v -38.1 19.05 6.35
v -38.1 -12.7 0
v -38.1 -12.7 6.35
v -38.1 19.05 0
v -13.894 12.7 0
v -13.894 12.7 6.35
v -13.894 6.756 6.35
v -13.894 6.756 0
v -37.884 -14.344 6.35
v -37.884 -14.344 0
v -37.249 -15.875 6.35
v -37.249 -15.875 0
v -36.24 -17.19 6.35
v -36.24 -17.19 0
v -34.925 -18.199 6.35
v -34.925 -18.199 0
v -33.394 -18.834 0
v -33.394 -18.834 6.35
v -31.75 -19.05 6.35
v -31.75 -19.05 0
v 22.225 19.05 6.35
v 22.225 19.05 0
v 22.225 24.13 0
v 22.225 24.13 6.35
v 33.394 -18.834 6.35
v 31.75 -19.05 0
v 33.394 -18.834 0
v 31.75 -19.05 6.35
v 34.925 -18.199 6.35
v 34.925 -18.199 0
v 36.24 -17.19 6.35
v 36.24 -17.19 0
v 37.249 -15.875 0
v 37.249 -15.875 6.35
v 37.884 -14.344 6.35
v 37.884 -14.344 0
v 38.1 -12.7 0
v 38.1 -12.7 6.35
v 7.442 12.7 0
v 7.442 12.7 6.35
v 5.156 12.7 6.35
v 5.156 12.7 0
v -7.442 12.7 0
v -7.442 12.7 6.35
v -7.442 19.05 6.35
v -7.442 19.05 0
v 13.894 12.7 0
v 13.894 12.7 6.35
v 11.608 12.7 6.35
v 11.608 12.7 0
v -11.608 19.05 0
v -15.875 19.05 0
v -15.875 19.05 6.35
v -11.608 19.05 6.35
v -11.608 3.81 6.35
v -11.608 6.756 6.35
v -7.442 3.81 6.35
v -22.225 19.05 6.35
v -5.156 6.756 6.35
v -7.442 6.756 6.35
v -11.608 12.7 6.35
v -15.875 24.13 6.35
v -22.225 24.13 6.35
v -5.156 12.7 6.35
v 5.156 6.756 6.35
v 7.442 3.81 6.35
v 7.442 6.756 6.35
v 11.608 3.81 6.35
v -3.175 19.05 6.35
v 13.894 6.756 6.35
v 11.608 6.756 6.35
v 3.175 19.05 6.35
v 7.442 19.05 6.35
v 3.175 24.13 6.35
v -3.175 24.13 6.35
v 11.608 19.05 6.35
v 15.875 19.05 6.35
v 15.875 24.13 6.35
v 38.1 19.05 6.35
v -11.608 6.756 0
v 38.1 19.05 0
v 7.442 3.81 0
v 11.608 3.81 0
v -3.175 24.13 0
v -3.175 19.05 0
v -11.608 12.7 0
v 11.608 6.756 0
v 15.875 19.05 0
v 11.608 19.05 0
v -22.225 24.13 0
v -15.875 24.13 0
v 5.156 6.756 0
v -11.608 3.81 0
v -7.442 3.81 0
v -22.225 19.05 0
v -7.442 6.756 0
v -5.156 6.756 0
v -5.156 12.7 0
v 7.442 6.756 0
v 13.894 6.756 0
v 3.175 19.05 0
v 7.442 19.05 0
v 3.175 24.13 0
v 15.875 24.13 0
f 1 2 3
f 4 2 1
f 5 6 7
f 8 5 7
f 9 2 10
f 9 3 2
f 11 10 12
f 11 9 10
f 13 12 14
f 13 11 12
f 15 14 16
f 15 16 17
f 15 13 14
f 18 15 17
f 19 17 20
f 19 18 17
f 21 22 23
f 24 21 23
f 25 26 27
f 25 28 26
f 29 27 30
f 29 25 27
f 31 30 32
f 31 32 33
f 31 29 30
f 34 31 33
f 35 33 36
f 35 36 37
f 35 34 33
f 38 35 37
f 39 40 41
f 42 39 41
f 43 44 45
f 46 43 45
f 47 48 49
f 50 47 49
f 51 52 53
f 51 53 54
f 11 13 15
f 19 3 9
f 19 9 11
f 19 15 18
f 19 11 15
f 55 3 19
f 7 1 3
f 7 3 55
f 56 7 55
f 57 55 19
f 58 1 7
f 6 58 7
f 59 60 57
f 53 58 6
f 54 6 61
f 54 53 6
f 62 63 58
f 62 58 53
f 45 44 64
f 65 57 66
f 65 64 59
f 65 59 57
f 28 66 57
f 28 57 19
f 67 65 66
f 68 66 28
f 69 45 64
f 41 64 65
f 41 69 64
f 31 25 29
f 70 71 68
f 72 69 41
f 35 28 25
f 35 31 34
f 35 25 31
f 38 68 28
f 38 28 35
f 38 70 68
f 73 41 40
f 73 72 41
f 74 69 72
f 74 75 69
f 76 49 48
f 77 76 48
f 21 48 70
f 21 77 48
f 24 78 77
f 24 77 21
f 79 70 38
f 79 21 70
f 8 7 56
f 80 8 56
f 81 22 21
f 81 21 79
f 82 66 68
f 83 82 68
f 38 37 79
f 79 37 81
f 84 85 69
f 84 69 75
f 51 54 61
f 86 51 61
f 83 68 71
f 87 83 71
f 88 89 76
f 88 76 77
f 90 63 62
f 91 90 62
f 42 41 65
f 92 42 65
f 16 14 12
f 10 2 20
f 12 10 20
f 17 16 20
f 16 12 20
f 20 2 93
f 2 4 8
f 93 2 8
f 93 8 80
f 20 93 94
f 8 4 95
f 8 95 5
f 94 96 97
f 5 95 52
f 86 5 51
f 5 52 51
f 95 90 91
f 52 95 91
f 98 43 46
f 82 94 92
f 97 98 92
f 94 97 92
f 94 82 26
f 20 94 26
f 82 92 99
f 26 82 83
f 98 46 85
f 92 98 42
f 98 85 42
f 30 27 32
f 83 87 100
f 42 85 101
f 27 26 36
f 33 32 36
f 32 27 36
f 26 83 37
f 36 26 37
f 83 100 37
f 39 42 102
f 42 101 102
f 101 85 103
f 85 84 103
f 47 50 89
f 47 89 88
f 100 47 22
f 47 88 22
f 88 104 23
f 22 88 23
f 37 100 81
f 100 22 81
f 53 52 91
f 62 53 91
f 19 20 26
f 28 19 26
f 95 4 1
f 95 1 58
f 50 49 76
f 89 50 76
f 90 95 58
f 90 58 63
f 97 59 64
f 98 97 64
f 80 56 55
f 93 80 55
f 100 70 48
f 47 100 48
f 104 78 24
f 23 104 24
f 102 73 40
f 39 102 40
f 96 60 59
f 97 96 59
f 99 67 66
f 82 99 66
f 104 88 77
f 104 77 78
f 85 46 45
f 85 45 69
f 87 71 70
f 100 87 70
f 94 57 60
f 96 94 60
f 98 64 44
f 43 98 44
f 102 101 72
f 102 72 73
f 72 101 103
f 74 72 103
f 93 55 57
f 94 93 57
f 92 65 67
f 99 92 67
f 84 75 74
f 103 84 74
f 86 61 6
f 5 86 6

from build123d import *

# Parameters (mm, degrees)
SKETCH1_W           = 76.2
SKETCH1_H           = 38.1
BOSS_EXTRUDE1_DEPTH = 6.35
SKETCH3_W           = 6.35
SKETCH3_H           = 5.08
BOSS_EXTRUDE2_DEPTH = 6.35
CUT_EXTRUDE1_DEPTH  = 7.35
FILLET1_R           = 6.35


with BuildPart() as part:
    # Sketch1 → Boss-Extrude1 (new body)
    with BuildSketch(Plane.XY):
        Rectangle(SKETCH1_W, SKETCH1_H)
    extrude(amount=BOSS_EXTRUDE1_DEPTH)

    # Sketch3 → Boss-Extrude2 (add)
    with BuildSketch(Plane.XY.offset(6.35)):
        with Locations((19.05, 21.59)):
            Rectangle(SKETCH3_W, SKETCH3_H)
        with Locations((-19.05, 21.59)):
            Rectangle(SKETCH3_W, SKETCH3_H)
        with Locations((0, 21.59)):
            Rectangle(SKETCH3_W, SKETCH3_H)
    extrude(amount=-BOSS_EXTRUDE2_DEPTH)

    # Sketch6 → Cut-Extrude1 (cut, through all)
    with BuildSketch(Plane.XY.offset(6.35)):
        Polygon((-11.6078, 19.05), (-11.6078, 12.7), (-13.8938, 12.7), (-13.8938, 6.7564), (-11.6078, 6.7564), (-11.6078, 3.81), (-7.4422, 3.81), (-7.4422, 6.7564), (-5.1562, 6.7564), (-5.1562, 12.7), (-7.4422, 12.7), (-7.4422, 19.05), align=None)
        Polygon((7.4422, 19.05), (7.4422, 12.7), (5.1562, 12.7), (5.1562, 6.7564), (7.4422, 6.7564), (7.4422, 3.81), (11.6078, 3.81), (11.6078, 6.7564), (13.8938, 6.7564), (13.8938, 12.7), (11.6078, 12.7), (11.6078, 19.05), align=None)
    extrude(amount=-CUT_EXTRUDE1_DEPTH, mode=Mode.SUBTRACT)

    # Fillet1
    fillet1_edges = [part.edges().sort_by_distance(p)[0] for p in [
        (38.1, -19.05, 3.175),
        (-38.1, -19.05, 3.175),
    ]]
    fillet(fillet1_edges, radius=FILLET1_R)


solid = part.part
